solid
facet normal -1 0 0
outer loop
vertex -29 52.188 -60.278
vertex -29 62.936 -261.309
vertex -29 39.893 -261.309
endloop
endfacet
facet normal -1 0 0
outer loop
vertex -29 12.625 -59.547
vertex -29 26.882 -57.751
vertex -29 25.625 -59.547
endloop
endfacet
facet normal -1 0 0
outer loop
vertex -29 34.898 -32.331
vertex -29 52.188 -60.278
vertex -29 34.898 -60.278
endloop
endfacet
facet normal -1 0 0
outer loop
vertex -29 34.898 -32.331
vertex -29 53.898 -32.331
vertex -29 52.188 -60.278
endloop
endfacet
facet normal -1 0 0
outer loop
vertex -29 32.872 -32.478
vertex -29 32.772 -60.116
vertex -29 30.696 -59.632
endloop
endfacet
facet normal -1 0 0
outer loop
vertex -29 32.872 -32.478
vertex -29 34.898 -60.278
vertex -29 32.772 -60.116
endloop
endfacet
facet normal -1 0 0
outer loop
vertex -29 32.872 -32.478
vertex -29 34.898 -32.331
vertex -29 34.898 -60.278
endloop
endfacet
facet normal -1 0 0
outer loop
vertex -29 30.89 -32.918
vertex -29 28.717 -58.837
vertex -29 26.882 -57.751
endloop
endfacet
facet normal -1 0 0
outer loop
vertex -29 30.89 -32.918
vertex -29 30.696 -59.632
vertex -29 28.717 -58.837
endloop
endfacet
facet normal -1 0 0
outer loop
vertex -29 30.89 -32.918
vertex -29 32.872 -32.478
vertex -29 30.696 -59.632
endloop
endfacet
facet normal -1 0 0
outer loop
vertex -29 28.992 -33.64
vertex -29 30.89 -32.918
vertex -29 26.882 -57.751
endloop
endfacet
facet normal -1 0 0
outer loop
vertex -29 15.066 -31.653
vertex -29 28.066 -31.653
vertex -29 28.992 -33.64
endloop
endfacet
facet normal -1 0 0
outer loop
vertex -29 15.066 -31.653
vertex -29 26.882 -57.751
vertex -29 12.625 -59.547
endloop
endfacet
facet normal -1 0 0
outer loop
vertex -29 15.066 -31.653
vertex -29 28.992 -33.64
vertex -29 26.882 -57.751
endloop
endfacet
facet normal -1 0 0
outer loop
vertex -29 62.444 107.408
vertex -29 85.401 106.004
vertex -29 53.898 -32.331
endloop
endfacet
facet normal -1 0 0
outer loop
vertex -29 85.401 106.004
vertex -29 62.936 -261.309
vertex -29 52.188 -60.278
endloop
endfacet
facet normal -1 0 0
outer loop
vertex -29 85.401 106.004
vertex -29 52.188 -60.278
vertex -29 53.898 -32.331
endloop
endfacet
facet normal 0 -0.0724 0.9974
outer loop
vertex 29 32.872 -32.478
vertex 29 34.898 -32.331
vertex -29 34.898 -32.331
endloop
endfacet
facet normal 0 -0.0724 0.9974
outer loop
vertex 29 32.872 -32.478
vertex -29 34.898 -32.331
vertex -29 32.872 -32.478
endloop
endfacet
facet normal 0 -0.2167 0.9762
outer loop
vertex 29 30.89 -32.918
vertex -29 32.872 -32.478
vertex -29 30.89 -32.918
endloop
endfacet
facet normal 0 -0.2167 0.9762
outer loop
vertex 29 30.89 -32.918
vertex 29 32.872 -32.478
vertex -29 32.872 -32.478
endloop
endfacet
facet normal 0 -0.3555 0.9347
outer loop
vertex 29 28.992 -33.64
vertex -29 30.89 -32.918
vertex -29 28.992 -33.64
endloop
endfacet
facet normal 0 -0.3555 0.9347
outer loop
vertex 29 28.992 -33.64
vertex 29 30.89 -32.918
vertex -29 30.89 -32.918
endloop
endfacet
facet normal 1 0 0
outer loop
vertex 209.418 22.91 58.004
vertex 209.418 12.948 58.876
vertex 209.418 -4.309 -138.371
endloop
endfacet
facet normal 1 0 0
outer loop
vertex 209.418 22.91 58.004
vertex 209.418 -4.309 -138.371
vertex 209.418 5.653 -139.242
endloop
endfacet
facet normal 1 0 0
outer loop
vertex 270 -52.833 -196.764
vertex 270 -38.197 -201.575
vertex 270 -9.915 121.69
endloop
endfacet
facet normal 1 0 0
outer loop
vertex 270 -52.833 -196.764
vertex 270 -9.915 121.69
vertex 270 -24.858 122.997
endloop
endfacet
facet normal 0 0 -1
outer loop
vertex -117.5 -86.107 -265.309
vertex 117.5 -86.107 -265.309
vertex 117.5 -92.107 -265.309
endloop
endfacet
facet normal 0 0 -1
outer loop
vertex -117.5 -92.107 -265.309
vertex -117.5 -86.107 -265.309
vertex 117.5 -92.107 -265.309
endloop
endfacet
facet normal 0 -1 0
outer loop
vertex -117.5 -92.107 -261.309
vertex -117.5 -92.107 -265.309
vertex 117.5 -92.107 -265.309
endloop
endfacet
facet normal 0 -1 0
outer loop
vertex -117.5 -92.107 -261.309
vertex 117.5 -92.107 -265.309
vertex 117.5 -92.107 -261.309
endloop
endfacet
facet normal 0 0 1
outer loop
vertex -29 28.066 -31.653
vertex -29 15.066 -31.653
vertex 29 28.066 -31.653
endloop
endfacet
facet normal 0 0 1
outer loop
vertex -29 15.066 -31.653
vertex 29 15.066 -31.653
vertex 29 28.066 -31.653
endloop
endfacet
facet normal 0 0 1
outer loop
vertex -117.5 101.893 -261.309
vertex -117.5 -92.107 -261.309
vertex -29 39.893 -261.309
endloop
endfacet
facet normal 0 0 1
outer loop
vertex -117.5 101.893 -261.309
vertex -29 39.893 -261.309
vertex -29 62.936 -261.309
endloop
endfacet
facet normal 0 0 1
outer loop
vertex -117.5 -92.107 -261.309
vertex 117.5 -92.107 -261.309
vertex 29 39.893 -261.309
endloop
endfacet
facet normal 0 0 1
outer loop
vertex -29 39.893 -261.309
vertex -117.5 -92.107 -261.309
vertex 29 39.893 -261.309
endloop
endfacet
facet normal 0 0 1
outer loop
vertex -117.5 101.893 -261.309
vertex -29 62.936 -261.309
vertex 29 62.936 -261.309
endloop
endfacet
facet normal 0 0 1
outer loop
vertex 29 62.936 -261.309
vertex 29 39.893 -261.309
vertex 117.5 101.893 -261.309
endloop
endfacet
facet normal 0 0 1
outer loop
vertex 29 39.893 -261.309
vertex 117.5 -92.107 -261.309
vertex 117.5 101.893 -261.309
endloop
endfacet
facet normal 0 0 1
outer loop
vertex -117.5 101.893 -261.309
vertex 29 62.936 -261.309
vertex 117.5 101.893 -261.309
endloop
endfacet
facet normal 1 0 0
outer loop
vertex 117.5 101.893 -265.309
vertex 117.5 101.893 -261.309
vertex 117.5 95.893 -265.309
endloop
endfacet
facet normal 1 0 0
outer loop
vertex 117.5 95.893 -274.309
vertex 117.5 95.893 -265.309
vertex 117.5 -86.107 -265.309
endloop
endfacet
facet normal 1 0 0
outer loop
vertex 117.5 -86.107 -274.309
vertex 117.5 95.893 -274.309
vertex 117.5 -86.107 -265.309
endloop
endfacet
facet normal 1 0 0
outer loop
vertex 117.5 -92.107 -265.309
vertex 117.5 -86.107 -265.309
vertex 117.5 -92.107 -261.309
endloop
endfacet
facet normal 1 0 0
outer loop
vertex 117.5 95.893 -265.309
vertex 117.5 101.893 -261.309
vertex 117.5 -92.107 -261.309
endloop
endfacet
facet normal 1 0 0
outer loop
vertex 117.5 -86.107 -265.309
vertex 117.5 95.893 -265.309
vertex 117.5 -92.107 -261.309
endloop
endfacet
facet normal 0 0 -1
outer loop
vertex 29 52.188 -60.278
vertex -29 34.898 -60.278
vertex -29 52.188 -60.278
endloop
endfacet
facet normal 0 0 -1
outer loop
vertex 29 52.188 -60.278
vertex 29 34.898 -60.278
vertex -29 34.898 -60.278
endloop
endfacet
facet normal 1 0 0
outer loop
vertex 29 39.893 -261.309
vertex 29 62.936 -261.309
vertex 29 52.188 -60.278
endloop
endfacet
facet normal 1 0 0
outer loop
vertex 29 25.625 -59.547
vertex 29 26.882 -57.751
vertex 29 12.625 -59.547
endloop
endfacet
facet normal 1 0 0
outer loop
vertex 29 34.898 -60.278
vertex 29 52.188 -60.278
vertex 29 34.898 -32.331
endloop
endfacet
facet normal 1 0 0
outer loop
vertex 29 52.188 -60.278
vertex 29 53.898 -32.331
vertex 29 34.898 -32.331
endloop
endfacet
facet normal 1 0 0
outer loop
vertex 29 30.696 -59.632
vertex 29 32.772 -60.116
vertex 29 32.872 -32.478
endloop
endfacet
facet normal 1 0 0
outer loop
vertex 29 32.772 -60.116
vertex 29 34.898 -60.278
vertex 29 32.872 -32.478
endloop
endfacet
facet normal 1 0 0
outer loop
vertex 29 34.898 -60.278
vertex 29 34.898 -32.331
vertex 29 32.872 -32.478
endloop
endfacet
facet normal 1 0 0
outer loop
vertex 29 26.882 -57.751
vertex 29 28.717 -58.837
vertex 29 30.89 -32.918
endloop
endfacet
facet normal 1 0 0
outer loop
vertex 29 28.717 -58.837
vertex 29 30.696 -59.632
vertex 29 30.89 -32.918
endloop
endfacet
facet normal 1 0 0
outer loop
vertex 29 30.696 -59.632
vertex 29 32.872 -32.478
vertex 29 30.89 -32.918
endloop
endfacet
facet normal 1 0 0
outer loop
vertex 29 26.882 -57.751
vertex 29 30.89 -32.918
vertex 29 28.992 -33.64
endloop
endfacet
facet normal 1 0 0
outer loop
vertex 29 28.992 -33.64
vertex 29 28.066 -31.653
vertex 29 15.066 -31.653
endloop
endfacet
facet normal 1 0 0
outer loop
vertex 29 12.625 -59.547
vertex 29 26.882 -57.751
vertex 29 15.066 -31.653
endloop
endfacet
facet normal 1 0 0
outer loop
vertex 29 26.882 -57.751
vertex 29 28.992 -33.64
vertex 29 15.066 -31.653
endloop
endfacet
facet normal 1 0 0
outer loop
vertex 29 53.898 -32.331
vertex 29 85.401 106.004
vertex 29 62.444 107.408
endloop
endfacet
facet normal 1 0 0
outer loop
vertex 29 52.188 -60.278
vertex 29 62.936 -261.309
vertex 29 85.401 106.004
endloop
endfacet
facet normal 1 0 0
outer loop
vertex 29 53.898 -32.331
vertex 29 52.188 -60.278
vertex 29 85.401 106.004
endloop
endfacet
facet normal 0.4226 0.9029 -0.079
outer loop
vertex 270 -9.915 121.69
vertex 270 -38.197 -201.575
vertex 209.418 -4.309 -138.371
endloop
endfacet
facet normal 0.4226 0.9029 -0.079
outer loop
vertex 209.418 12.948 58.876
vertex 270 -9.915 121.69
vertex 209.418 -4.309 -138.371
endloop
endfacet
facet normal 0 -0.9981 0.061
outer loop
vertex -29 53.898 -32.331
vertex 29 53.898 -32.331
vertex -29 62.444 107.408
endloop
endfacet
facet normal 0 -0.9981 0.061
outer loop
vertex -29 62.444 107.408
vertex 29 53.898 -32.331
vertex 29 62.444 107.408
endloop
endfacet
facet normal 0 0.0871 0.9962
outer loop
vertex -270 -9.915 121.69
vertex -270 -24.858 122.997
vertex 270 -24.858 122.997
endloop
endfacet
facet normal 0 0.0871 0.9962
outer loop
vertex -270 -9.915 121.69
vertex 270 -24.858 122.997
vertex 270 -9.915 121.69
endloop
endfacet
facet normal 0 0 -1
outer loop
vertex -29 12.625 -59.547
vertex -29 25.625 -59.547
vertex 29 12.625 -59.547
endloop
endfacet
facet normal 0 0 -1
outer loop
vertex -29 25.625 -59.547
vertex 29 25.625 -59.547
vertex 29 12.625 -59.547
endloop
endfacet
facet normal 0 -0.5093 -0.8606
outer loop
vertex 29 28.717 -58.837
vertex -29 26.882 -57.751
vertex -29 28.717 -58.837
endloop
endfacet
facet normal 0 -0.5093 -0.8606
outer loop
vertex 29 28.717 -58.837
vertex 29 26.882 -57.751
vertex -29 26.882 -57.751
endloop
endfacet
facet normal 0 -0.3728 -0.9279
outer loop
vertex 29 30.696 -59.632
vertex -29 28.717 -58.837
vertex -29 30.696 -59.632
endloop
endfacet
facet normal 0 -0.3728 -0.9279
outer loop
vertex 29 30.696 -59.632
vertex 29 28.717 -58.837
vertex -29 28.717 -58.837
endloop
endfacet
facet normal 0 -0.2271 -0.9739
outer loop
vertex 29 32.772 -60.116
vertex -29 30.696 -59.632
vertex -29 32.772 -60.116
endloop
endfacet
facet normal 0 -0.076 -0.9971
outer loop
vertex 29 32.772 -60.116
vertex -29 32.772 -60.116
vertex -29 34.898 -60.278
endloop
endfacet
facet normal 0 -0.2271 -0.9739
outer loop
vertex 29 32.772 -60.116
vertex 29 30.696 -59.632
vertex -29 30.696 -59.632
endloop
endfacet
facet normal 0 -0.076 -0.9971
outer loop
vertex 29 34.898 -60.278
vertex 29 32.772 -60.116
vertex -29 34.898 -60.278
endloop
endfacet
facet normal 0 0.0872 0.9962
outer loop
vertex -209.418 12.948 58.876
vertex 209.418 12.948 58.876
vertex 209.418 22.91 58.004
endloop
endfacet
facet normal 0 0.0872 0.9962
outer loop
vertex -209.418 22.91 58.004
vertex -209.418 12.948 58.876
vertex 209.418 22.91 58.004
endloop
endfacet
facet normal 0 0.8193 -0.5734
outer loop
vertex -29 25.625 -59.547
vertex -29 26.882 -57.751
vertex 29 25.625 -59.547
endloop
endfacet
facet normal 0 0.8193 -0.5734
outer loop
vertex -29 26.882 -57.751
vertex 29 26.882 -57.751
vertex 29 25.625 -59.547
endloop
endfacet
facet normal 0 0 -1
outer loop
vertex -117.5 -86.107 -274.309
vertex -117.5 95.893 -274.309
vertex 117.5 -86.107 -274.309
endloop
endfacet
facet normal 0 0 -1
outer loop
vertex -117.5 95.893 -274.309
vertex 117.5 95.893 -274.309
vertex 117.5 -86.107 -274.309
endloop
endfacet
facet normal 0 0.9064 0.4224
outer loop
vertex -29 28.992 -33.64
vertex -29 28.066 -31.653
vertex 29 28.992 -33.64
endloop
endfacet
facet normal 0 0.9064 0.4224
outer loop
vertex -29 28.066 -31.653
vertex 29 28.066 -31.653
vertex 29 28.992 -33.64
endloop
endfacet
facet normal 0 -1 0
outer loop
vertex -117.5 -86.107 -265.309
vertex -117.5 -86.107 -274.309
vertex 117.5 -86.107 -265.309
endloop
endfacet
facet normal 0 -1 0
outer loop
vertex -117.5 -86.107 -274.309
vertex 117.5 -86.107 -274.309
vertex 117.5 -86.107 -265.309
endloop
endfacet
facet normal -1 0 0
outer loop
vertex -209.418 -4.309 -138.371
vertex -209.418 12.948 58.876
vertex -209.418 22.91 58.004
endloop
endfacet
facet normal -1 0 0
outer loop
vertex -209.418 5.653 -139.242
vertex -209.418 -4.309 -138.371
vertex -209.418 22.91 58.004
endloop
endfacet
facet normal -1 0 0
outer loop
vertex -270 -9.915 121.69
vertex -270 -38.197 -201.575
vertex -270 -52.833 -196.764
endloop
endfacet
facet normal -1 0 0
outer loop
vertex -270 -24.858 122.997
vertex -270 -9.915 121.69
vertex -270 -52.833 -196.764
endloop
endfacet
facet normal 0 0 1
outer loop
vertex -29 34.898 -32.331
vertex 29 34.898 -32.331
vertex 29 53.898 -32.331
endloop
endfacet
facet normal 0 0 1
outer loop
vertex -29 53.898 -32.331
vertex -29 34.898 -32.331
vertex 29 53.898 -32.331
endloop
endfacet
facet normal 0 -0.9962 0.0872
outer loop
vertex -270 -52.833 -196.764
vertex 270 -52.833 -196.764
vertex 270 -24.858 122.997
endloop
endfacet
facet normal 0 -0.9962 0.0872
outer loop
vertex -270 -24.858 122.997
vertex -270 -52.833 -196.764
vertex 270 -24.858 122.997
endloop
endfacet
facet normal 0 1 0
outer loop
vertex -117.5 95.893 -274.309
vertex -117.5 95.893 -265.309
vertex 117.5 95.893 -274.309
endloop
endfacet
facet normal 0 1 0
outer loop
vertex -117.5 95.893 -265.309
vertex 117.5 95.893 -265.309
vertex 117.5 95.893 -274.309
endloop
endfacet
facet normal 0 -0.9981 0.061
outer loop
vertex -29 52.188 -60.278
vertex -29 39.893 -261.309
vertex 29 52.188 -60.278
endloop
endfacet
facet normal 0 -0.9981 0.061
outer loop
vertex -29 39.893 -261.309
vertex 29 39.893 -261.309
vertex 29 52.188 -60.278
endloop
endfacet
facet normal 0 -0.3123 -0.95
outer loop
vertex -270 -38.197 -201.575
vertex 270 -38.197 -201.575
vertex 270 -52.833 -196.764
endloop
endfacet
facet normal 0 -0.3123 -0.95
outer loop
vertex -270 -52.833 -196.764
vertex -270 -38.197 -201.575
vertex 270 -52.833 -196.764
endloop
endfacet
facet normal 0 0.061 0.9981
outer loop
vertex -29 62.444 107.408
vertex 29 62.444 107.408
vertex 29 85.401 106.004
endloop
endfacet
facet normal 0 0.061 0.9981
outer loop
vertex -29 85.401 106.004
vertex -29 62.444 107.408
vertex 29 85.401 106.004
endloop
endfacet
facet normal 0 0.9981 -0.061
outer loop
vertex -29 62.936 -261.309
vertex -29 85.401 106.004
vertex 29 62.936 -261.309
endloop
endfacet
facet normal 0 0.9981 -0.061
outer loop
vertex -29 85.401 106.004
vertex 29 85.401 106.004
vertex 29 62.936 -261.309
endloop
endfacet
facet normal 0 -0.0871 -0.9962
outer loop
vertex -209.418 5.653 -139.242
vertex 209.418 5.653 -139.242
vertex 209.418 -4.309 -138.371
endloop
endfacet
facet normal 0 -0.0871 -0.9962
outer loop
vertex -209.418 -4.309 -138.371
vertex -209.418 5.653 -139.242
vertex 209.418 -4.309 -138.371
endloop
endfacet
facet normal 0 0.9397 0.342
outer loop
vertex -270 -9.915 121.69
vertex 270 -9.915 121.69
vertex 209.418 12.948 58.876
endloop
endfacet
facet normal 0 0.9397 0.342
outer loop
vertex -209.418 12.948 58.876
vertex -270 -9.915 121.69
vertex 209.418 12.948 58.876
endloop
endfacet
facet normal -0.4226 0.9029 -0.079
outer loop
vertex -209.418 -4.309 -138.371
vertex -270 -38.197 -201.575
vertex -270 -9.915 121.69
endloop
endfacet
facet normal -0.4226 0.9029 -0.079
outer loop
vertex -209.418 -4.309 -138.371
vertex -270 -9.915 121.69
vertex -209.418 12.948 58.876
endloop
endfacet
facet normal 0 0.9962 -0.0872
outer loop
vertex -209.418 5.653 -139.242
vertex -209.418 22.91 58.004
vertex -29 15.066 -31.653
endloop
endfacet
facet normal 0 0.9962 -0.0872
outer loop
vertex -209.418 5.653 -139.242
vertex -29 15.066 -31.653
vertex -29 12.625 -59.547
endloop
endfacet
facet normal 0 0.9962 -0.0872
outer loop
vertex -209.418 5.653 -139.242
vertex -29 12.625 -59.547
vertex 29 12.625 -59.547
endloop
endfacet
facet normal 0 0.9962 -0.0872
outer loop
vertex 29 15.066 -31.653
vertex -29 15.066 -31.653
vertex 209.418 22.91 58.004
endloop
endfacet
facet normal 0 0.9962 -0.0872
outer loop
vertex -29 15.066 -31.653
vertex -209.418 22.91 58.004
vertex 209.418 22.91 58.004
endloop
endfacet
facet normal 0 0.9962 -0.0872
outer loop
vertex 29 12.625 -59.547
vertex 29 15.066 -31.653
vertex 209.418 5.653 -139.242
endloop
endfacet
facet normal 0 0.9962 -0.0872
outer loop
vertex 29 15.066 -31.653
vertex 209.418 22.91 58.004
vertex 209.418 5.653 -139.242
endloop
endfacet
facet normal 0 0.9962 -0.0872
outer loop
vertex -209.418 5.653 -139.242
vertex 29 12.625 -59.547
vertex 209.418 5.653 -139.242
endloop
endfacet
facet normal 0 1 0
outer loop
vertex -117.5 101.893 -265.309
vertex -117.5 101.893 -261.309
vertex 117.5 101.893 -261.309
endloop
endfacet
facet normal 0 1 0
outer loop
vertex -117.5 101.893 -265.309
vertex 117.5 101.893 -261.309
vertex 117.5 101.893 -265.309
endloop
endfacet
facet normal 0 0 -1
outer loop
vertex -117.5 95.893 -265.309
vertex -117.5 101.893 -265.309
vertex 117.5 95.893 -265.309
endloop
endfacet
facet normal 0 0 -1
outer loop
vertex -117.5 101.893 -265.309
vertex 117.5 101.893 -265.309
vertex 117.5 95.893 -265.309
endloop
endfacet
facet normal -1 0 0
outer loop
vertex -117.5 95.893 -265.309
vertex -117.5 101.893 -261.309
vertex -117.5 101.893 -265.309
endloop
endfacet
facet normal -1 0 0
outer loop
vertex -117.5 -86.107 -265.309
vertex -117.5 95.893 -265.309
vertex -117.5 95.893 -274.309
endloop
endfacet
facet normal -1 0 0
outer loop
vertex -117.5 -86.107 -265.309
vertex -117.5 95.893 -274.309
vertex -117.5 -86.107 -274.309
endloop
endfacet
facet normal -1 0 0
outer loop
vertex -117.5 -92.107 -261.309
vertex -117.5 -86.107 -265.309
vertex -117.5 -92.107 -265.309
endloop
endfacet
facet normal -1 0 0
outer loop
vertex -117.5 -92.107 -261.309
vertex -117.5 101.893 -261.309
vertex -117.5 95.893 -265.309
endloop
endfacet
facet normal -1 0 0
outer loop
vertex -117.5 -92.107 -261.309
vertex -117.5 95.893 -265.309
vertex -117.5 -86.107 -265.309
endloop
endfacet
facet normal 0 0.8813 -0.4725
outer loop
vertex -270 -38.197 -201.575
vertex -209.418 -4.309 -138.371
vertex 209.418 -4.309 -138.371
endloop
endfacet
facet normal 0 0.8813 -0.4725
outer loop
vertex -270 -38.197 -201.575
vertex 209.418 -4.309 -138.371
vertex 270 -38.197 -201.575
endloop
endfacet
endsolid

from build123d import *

# Parameters (mm, degrees)
PAD_DEPTH         = 270
PAD001_DEPTH      = 29
PAD002_DEPTH      = 117.5
POCKET_DEPTH      = 341.0745213347
POCKET_DEPTH_BACK = 71.6303346662


with BuildPart() as part:
    # Sketch001 → Pad (new body, symmetric)
    with BuildSketch(Plane.YZ):
        Polygon((-24.8576477137, 122.9970951405), (-9.9147272423, 121.6897589993), (12.9476758379, 58.8758227821), (22.9096228188, 58.0042653546), (5.6527857547, -139.2422848675), (-4.3091612262, -138.3707274401), (-38.1967657639, -201.5754205315), (-52.8330949144, -196.7637295572), align=None)
    extrude(amount=PAD_DEPTH, both=True)

    # Sketch002 → Pad001 (join, symmetric)
    with BuildSketch(Plane.YZ):
        with BuildLine():
            Line((62.4443669874, 107.4083042285), (85.4014673511, 106.0041878192))
            Line((85.4014673511, 106.0041878192), (62.9356048023, -261.309418))
            Line((62.9356048023, -261.309418), (39.892625, -261.309418))
            Line((39.892625, -261.309418), (52.1882123456, -60.2783419063))
            Line((34.8975714525, -60.2783419063), (52.1882123456, -60.2783419063))
            ThreePointArc((26.8824790431, -57.7511929769), (30.6955425365, -59.6315877978), (34.8975714525, -60.2783419063))
            Line((26.8824790431, -57.7511929769), (25.6252451745, -59.5467090202))
            Line((25.6252451745, -59.5467090202), (12.6252451745, -59.5467090202))
            Line((15.0656059715, -31.6532574736), (12.6252451745, -59.5467090202))
            Line((15.0656059715, -31.6532574736), (28.0656059715, -31.6532574736))
            Line((28.0656059715, -31.6532574736), (28.9919515436, -33.6398119639))
            ThreePointArc((34.8975714525, -32.3305675505), (31.8730687065, -32.6618044727), (28.9919515436, -33.6398119639))
            Line((34.8975714525, -32.3305675505), (53.8975714525, -32.3305675505))
            Line((53.8975714525, -32.3305675505), (62.4443669874, 107.4083042285))
        make_face()
    extrude(amount=PAD001_DEPTH, both=True)

    # Sketch003 → Pad002 (join, symmetric)
    with BuildSketch(Plane.YZ):
        Polygon((-92.107375, -261.309418), (101.892625, -261.309418), (101.892625, -265.309418), (95.892625, -265.309418), (95.892625, -274.309418), (-86.107375, -274.309418), (-86.107375, -265.309418), (-92.107375, -265.309418), align=None)
    extrude(amount=PAD002_DEPTH, both=True)

    # Sketch004 (on DatumPlane) → Pocket (cut, two sides)
    with BuildSketch(Plane(origin=(0, 5.210191812, 59.5527649186), x_dir=(0, -0.9961946981, 0.0871557427), z_dir=(0, 0.0871557427, 0.9961946981))) as pocket_sk:
        Polygon((20.4829600422, 270), (-7.7670399578, 209.4176794956), (-17.7670399578, 209.4176794956), (-17.7670399578, 270), align=None)
        Polygon((20.4829600422, -270), (-7.7670399578, -209.4176794956), (-17.7670399578, -209.4176794956), (-17.7670399578, -270), align=None)
    extrude(amount=-POCKET_DEPTH, mode=Mode.SUBTRACT)
    extrude(pocket_sk.sketch, amount=POCKET_DEPTH_BACK, mode=Mode.SUBTRACT)


solid = part.part
